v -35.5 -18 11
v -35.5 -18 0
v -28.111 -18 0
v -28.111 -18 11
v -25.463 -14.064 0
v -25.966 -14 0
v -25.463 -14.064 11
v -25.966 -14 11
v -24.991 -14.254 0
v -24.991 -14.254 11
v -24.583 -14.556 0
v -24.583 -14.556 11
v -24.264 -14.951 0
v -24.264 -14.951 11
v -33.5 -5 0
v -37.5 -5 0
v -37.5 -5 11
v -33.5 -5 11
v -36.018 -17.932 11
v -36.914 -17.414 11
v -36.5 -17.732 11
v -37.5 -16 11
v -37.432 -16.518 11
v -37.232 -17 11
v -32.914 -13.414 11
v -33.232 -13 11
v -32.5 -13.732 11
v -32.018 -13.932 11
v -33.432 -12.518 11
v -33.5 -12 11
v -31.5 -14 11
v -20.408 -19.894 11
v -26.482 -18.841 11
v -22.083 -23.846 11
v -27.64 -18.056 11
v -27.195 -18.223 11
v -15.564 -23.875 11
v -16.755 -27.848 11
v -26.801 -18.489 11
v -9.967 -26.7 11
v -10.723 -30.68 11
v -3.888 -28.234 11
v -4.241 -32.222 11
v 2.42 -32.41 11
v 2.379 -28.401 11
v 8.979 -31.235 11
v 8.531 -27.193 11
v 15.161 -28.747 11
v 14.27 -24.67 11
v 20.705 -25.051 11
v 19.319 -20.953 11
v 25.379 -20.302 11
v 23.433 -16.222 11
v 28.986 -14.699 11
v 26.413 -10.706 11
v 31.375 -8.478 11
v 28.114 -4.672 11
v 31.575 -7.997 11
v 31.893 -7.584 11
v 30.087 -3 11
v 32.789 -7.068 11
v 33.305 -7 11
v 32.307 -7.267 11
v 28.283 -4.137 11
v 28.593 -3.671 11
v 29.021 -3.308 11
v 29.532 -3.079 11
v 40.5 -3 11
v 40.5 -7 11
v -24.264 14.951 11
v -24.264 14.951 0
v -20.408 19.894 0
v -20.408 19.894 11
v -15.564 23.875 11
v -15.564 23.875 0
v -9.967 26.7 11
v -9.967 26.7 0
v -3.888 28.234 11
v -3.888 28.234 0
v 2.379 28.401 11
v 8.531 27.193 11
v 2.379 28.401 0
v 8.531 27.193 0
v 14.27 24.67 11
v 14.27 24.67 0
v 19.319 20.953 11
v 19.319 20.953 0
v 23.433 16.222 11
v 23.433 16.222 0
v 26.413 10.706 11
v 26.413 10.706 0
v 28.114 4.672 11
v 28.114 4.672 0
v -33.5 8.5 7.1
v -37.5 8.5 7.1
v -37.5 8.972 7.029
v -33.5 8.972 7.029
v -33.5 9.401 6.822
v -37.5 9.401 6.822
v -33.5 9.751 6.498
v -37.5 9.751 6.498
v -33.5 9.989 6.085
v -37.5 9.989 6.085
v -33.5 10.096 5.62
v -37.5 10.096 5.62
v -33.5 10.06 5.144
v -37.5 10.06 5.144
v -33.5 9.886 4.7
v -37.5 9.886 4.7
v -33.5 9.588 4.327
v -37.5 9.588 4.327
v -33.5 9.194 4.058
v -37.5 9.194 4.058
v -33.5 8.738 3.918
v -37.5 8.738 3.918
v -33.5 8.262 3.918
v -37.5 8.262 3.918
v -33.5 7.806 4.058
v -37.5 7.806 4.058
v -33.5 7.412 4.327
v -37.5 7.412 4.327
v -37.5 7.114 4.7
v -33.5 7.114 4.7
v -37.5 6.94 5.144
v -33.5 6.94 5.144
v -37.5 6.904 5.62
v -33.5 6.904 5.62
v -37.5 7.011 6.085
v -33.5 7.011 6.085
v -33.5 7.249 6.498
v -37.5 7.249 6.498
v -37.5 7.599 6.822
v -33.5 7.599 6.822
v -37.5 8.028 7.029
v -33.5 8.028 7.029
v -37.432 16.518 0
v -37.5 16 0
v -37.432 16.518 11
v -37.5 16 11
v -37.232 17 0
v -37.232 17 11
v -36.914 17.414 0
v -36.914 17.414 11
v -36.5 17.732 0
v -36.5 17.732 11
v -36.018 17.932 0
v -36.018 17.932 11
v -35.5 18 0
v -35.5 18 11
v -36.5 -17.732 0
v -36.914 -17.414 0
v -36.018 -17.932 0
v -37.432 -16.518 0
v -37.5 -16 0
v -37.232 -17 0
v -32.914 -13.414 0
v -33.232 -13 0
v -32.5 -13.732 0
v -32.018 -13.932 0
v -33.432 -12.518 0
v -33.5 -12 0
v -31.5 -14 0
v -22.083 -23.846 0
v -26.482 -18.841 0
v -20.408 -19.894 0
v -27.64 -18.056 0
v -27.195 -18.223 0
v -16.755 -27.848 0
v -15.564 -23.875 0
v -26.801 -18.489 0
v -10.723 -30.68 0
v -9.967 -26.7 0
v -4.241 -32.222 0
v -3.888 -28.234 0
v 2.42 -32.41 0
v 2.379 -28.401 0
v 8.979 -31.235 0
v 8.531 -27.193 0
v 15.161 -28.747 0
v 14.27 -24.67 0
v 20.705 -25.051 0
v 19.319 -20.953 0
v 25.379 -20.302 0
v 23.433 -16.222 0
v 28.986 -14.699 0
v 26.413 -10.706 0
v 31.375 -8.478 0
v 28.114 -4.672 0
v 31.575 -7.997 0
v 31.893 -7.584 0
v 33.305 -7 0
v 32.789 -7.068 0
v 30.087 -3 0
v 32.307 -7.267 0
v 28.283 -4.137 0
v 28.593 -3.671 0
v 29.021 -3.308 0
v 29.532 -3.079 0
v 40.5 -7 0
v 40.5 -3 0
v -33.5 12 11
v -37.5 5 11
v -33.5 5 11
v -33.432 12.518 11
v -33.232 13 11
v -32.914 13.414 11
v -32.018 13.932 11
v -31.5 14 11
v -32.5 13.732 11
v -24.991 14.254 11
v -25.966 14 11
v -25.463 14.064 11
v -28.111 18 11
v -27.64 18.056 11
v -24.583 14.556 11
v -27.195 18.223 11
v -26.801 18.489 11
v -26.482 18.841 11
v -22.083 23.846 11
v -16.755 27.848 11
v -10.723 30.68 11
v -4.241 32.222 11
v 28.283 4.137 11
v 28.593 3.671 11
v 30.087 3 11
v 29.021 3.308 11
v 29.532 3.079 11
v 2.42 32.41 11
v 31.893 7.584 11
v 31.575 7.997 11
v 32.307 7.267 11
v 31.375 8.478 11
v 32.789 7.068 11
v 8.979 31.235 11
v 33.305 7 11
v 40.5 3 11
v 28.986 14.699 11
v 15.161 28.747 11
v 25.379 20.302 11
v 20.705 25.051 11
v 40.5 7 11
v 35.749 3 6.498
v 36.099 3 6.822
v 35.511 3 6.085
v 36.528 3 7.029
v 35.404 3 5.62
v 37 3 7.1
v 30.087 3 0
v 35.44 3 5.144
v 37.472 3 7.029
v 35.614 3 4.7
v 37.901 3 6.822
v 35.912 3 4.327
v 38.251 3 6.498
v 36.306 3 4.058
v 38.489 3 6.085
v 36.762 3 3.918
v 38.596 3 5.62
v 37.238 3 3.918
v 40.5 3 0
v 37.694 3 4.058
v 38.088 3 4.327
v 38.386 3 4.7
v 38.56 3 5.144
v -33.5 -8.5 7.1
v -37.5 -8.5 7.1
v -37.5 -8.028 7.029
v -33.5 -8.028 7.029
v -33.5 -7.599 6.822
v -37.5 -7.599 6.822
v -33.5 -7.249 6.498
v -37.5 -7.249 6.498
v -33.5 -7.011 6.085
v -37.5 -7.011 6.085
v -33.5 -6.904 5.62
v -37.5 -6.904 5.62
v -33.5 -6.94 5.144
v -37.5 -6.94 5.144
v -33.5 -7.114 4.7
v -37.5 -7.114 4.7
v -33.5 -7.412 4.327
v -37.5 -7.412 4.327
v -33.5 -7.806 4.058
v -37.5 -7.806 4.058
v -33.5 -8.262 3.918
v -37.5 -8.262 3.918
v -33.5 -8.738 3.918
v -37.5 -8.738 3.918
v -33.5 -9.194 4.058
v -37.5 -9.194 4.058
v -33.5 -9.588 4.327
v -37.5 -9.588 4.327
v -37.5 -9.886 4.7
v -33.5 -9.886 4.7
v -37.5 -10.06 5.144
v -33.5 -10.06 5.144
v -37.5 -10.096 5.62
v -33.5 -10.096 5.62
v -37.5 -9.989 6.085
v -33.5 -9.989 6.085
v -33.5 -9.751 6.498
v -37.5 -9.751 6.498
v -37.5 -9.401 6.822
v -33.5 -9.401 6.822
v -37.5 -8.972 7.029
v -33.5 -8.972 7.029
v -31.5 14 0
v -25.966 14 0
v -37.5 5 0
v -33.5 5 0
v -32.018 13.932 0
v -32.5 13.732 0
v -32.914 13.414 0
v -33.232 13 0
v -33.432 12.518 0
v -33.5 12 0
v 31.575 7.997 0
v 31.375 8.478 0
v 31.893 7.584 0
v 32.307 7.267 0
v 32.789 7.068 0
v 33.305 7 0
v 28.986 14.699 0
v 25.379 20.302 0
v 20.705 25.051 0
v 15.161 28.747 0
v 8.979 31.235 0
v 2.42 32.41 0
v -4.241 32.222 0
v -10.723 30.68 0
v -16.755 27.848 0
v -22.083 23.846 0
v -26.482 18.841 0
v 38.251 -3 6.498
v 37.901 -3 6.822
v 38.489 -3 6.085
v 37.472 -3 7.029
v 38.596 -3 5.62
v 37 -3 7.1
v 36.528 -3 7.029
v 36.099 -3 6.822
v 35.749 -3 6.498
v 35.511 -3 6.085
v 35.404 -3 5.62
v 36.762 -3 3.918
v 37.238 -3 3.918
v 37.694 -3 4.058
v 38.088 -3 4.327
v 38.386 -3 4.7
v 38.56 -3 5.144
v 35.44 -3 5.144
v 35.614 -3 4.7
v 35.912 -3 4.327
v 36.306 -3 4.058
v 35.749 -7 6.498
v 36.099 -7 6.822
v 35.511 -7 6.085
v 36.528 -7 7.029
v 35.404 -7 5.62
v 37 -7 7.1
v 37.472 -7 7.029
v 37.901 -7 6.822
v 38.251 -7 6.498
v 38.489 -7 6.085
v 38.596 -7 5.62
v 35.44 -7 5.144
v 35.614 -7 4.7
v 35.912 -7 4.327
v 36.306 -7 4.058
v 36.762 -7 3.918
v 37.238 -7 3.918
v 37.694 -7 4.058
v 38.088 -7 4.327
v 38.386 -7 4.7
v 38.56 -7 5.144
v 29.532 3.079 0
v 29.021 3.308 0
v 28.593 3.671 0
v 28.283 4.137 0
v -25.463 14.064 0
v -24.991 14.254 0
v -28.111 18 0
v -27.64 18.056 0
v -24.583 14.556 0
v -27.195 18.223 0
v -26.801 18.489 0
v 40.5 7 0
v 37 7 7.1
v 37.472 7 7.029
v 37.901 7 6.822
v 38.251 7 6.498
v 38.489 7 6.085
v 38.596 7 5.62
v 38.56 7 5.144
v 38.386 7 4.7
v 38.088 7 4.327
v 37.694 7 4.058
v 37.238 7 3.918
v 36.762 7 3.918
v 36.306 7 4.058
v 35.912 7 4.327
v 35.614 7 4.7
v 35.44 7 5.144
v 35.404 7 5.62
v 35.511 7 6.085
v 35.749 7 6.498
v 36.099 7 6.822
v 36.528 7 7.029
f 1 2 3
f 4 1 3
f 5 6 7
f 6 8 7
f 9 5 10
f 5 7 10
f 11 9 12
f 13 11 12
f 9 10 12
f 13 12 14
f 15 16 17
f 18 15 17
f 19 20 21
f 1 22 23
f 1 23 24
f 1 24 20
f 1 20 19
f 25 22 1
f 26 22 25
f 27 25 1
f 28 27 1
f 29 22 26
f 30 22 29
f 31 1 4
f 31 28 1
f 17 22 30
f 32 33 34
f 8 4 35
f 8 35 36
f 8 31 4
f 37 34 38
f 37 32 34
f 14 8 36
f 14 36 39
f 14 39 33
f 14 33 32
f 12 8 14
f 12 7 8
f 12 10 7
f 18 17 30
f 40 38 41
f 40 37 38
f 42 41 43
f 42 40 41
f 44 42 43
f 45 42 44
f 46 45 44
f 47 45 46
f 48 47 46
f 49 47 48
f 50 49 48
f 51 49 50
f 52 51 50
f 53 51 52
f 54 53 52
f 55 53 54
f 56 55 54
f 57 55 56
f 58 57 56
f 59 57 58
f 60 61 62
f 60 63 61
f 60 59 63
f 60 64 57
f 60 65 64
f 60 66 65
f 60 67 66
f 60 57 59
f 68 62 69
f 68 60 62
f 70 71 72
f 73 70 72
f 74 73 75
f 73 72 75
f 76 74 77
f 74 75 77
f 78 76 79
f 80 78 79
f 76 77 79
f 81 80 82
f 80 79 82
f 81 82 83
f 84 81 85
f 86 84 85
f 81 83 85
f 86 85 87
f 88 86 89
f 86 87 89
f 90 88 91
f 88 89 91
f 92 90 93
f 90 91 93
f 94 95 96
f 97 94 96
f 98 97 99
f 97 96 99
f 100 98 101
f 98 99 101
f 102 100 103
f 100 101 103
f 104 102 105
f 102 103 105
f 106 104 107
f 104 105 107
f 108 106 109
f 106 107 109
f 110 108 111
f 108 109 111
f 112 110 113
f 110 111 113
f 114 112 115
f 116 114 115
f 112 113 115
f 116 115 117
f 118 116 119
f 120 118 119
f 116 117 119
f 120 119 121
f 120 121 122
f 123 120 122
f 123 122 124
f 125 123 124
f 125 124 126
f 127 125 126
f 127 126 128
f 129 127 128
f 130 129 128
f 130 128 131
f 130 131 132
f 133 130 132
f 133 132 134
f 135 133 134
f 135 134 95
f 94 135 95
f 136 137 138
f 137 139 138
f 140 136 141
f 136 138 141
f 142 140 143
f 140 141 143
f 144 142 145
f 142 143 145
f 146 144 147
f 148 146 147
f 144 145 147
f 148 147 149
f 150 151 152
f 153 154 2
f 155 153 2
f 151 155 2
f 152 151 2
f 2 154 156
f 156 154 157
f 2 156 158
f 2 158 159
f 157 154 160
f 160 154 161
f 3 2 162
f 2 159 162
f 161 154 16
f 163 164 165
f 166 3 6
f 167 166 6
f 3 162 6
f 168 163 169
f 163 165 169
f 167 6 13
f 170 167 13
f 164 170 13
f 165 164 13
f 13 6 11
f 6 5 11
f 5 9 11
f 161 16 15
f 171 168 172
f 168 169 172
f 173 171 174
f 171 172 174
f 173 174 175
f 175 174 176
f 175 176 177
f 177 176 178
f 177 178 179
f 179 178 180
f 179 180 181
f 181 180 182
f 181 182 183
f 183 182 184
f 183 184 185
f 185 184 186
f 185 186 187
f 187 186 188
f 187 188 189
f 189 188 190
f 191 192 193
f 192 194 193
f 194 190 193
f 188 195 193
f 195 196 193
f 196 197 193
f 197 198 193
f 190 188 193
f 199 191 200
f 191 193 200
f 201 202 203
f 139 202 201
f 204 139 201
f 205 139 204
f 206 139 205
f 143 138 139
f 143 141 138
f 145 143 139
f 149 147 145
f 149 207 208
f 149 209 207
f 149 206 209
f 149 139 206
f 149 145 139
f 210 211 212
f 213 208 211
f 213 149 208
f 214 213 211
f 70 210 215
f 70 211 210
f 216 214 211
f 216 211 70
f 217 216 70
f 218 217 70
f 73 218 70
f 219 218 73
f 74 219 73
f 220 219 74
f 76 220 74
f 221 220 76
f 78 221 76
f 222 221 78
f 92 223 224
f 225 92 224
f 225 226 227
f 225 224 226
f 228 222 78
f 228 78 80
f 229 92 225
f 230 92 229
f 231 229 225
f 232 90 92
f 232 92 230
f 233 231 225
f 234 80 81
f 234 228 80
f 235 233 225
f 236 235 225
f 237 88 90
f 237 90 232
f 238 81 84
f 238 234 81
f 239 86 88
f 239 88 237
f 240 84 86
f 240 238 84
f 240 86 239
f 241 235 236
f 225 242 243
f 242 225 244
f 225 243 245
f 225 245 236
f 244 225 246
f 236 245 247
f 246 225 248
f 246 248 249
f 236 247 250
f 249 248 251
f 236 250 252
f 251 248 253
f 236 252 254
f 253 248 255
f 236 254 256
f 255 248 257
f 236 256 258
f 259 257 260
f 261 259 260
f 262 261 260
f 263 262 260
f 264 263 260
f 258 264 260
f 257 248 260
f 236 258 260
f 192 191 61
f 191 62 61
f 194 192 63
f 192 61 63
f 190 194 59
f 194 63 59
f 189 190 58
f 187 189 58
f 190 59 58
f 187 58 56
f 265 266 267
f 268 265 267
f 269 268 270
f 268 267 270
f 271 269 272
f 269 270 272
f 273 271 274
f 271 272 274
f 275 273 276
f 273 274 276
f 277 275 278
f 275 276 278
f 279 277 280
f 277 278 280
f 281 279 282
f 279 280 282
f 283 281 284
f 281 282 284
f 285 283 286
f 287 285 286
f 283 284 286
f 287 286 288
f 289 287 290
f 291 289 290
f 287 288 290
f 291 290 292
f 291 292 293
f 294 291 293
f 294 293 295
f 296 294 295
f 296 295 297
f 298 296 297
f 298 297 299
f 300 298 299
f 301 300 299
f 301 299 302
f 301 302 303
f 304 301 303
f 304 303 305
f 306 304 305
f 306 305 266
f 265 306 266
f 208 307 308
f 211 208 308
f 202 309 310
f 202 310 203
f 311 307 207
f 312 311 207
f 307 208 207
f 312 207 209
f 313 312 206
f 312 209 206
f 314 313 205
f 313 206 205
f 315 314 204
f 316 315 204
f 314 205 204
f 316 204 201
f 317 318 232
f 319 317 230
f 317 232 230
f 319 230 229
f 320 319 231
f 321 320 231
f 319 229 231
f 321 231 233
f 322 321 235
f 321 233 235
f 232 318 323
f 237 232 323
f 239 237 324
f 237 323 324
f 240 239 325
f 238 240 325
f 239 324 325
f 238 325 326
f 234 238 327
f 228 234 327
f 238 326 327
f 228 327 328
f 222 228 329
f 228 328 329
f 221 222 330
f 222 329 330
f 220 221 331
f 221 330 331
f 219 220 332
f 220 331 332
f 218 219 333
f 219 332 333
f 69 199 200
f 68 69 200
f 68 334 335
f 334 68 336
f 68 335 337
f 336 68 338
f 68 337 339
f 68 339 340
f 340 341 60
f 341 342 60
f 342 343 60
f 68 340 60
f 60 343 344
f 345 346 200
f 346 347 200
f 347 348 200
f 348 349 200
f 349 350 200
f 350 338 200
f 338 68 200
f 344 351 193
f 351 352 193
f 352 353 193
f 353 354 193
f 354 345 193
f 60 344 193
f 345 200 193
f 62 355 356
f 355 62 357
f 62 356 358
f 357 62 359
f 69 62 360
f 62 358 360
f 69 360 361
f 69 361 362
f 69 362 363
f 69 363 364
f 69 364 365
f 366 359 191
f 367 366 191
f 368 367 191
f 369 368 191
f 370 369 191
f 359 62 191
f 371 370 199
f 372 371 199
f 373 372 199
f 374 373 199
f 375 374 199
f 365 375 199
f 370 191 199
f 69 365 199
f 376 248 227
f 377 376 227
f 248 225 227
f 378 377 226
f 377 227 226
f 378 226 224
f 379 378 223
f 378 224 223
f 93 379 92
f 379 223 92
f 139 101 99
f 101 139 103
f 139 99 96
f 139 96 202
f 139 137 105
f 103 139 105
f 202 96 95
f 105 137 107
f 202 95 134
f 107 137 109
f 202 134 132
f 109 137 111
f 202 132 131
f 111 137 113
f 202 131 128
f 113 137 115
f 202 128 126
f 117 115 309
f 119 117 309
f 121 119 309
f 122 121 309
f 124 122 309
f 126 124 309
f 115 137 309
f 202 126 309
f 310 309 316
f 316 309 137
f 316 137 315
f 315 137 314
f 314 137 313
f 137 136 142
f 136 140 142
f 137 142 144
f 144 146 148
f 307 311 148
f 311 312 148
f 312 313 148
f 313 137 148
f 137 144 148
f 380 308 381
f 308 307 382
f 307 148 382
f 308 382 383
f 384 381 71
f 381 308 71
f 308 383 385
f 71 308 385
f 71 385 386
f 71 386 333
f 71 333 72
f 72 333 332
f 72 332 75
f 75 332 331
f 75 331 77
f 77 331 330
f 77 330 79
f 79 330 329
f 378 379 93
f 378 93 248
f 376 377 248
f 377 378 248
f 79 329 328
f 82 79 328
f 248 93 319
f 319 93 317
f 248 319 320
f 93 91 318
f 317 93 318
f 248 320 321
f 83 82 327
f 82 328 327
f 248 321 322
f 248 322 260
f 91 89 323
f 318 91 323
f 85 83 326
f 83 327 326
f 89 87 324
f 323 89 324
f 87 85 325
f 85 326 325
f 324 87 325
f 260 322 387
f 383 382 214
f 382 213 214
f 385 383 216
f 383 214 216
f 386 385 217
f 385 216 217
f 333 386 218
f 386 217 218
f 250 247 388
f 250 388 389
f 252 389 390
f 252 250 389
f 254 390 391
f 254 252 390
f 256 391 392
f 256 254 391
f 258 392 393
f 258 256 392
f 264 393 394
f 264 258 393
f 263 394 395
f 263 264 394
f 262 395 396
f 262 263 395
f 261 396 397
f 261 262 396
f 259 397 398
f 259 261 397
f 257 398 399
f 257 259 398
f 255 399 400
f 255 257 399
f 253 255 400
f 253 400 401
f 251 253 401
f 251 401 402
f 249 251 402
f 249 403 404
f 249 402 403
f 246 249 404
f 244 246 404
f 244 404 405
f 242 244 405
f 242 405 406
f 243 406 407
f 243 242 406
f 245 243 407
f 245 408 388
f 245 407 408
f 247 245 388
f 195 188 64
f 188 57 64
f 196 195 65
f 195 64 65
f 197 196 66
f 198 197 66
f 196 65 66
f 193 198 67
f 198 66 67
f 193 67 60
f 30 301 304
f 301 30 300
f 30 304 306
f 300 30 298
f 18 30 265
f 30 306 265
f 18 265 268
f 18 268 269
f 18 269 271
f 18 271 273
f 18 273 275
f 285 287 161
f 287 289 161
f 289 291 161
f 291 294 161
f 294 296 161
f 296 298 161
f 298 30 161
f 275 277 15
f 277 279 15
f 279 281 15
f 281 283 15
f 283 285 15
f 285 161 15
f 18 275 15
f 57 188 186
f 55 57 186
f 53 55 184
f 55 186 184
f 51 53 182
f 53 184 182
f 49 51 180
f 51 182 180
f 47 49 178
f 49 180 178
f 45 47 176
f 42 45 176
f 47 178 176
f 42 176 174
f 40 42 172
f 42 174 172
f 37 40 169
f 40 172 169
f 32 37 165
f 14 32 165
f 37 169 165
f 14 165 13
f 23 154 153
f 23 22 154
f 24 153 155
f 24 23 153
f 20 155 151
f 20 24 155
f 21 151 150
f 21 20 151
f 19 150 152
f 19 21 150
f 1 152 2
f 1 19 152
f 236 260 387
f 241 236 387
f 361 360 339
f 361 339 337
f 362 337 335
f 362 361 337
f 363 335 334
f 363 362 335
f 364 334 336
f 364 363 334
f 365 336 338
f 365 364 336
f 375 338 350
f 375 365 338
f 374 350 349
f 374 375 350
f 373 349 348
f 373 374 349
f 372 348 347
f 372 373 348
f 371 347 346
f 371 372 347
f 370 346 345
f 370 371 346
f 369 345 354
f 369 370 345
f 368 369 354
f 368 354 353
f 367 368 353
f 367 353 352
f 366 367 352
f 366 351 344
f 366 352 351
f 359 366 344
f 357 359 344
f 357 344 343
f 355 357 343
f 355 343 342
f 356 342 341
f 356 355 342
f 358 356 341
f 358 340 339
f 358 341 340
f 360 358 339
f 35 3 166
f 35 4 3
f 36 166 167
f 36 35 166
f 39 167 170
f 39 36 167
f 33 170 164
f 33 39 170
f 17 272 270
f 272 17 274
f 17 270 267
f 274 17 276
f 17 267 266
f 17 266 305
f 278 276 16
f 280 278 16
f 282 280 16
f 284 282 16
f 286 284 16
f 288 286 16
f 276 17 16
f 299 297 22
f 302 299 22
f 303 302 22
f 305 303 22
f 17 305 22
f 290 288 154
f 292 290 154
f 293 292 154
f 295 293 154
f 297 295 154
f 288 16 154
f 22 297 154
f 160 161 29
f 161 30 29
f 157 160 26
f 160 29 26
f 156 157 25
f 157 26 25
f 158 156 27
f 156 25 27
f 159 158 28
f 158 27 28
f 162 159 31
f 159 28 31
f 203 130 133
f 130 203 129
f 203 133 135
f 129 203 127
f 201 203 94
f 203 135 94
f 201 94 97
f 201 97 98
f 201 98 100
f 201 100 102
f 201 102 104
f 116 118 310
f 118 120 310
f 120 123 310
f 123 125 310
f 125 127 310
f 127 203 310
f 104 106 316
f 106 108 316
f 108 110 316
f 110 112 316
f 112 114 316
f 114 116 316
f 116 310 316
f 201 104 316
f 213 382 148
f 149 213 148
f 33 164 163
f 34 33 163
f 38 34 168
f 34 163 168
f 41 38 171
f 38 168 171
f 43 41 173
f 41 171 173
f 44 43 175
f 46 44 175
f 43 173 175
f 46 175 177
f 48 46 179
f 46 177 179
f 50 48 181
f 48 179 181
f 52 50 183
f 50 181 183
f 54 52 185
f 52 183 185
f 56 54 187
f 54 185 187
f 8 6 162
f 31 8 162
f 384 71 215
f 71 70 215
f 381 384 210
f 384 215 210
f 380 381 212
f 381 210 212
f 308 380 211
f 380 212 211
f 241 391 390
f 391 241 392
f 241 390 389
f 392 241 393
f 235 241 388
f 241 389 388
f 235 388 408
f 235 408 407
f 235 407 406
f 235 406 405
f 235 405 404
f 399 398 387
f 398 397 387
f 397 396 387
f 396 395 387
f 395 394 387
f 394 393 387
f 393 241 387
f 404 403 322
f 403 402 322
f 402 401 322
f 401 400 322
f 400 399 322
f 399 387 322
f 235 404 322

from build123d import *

# Parameters (mm, degrees)
EXTRUDE_1_DEPTH          = 11
CUT_EXTRUDE_1_DEPTH      = 58.632456134
CUT_EXTRUDE_1_DEPTH_BACK = 58.632456134
SKETCH_3_R               = 1.6
CUT_EXTRUDE_4_REACH      = 87.213
SKETCH_5_R               = 1.6
SKETCH_5_W               = 11
SKETCH_5_H               = 10
FILLET_1_R               = 2
FILLET_2_R               = 2


with BuildPart() as part:
    # 草图1 → 凸台-拉伸1 (new body)
    with BuildSketch(Plane.XY):
        with BuildLine():
            Line((-37.5, 18), (-37.5, 14))
            Line((-37.5, 14), (-37.5, -14))
            Line((-37.5, -14), (-37.5, -18))
            Line((-37.5, -18), (-27.060118255, -18))
            ThreePointArc((-27.060118255, -18), (5.976518922, -31.945754359), (31.737202145, -7))
            Line((31.737202145, -7), (40.5, -7))
            Line((40.5, -7), (40.5, -3))
            Line((40.5, -3), (28.341665442, -3))
            ThreePointArc((28.341665442, -3), (5.774324085, -27.908908638), (-24.824383175, -14))
            Line((-24.824383175, -14), (-33.5, -14))
            Line((-33.5, -14), (-33.5, 14))
            Line((-33.5, 14), (-24.824383175, 14))
            ThreePointArc((-24.824383175, 14), (5.774324085, 27.908908638), (28.341665442, 3))
            Line((28.341665442, 3), (40.5, 3))
            Line((40.5, 3), (40.5, 7))
            Line((40.5, 7), (31.737202145, 7))
            ThreePointArc((31.737202145, 7), (5.976518922, 31.945754359), (-27.060118255, 18))
            Line((-27.060118255, 18), (-37.5, 18))
        make_face()
    extrude(amount=EXTRUDE_1_DEPTH)

    # 草图3 → 切除-拉伸1 (cut, two sides: drawn at the far end of the back side and taken through both)
    with BuildSketch(Plane(origin=(0, 7, 0), x_dir=(1, 0, 0), z_dir=(0, 1, 0)).offset(-CUT_EXTRUDE_1_DEPTH_BACK)):
        with Locations(Location((37, -5.5, 0), (0, 0, 270))):
            Circle(SKETCH_3_R)
    extrude(amount=CUT_EXTRUDE_1_DEPTH + CUT_EXTRUDE_1_DEPTH_BACK, mode=Mode.SUBTRACT)

    # 草图5 → 切除-拉伸4 (cut, up to next)
    with BuildSketch(Plane.ZY.offset(37.5), mode=Mode.PRIVATE) as cut_extrude_4_sk1:
        with Locations((5.5, 8.5)):
            Circle(SKETCH_5_R)
    cut_extrude_4_tool1 = extrude(cut_extrude_4_sk1.sketch, amount=-CUT_EXTRUDE_4_REACH, mode=Mode.PRIVATE) & part.part
    # 草图5 → 切除-拉伸4 (cut, up to next)
    with BuildSketch(Plane.ZY.offset(37.5), mode=Mode.PRIVATE) as cut_extrude_4_sk2:
        with Locations((5.5, -8.5)):
            Circle(SKETCH_5_R)
    cut_extrude_4_tool2 = extrude(cut_extrude_4_sk2.sketch, amount=-CUT_EXTRUDE_4_REACH, mode=Mode.PRIVATE) & part.part
    # 草图5 → 切除-拉伸4 (cut, up to next)
    with BuildSketch(Plane.ZY.offset(37.5), mode=Mode.PRIVATE) as cut_extrude_4_sk3:
        with Locations((5.5, 0)):
            Rectangle(SKETCH_5_W, SKETCH_5_H)
    cut_extrude_4_tool3 = extrude(cut_extrude_4_sk3.sketch, amount=-CUT_EXTRUDE_4_REACH, mode=Mode.PRIVATE) & part.part
    add(cut_extrude_4_tool1.solids().sort_by_distance((-37.5, 8.5, 5.5))[0], mode=Mode.SUBTRACT)
    add(cut_extrude_4_tool2.solids().sort_by_distance((-37.5, -8.5, 5.5))[0], mode=Mode.SUBTRACT)
    add(cut_extrude_4_tool3.solids().sort_by_distance((-37.5, 0, 5.5))[0], mode=Mode.SUBTRACT)


with BuildPart() as cut_extrude_4_piece_1:
    # of the separate pieces the step leaves, piece 1, a body of its own (cut_extrude_4_pieces)
    add(part.part.solids().sort_by_distance((-37.5, -5, 0))[0])

    # 圆角2
    fillet_2_edges = [cut_extrude_4_piece_1.edges().sort_by_distance(p)[0] for p in [
        (-33.5, -14, 5.5),
        (-37.5, -18, 5.5),
        (-27.060118255, -18, 5.5),
        (31.737202145, -7, 5.5),
        (28.341665442, -3, 5.5),
        (-24.824383175, -14, 5.5),
    ]]
    fillet(fillet_2_edges, radius=FILLET_2_R)


with BuildPart() as cut_extrude_4_piece_2:
    # of the separate pieces the step leaves, piece 2, a body of its own (cut_extrude_4_pieces)
    add(part.part.solids().sort_by_distance((-27.060118255, 18, 0))[0])

    # 圆角1
    fillet_1_edges = [cut_extrude_4_piece_2.edges().sort_by_distance(p)[0] for p in [
        (31.737202145, 7, 5.5),
        (28.341665442, 3, 5.5),
        (-24.824383175, 14, 5.5),
        (-33.5, 14, 5.5),
        (-37.5, 18, 5.5),
        (-27.060118255, 18, 5.5),
    ]]
    fillet(fillet_1_edges, radius=FILLET_1_R)


solid = Compound([cut_extrude_4_piece_1.part, cut_extrude_4_piece_2.part])
